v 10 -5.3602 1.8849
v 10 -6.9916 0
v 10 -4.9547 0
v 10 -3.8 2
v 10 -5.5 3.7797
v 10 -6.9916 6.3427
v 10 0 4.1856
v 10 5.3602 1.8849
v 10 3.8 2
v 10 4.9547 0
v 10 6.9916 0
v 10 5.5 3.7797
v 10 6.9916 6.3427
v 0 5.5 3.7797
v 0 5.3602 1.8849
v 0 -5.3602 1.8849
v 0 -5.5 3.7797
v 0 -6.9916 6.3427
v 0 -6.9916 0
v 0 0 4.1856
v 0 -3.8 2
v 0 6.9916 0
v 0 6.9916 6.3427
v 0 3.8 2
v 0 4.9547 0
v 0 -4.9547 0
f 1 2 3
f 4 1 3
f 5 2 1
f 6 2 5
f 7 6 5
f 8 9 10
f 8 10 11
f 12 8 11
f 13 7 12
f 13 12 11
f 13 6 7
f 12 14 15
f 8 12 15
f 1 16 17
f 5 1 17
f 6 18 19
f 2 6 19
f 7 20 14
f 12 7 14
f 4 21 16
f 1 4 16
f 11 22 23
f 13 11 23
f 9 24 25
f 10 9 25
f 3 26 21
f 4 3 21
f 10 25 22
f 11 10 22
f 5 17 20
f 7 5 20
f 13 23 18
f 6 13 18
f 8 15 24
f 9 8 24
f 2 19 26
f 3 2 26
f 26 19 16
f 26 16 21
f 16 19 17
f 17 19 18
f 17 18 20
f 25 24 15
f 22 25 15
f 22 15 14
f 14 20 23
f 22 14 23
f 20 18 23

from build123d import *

# Parameters (mm, degrees)
F2_DEPTH = 10


with BuildPart() as f2:
    # F1 (on Right) → F2 (new body)
    with BuildSketch(Plane.YZ):
        Polygon((-4.9547005384, 0), (-3.8, 2), (-5.3601791831, 1.8848744112), (-5.5, 3.7797227268), (0, 4.18556761), (0, 6), (-6.9916076098, 6), (-6.9916076098, 0), align=None)
        Polygon((-6.9916076098, 6.3426704399), (-6.9916076098, 6), (0, 6.3426704399), align=None)
        Polygon((0, 6.3426704399), (-6.9916076098, 6), (0, 6), align=None)
        Polygon((0, 6), (0, 4.18556761), (5.5, 3.7797227268), (5.3601791831, 1.8848744112), (3.8, 2), (4.9547005384, 0), (6.9916076098, 0), (6.9916076098, 6), align=None)
        Polygon((6.9916076098, 6), (0, 6.3426704399), (0, 6), align=None)
        Polygon((6.9916076098, 6.3426704399), (0, 6.3426704399), (6.9916076098, 6), align=None)
    extrude(amount=F2_DEPTH)


solid = f2.part
